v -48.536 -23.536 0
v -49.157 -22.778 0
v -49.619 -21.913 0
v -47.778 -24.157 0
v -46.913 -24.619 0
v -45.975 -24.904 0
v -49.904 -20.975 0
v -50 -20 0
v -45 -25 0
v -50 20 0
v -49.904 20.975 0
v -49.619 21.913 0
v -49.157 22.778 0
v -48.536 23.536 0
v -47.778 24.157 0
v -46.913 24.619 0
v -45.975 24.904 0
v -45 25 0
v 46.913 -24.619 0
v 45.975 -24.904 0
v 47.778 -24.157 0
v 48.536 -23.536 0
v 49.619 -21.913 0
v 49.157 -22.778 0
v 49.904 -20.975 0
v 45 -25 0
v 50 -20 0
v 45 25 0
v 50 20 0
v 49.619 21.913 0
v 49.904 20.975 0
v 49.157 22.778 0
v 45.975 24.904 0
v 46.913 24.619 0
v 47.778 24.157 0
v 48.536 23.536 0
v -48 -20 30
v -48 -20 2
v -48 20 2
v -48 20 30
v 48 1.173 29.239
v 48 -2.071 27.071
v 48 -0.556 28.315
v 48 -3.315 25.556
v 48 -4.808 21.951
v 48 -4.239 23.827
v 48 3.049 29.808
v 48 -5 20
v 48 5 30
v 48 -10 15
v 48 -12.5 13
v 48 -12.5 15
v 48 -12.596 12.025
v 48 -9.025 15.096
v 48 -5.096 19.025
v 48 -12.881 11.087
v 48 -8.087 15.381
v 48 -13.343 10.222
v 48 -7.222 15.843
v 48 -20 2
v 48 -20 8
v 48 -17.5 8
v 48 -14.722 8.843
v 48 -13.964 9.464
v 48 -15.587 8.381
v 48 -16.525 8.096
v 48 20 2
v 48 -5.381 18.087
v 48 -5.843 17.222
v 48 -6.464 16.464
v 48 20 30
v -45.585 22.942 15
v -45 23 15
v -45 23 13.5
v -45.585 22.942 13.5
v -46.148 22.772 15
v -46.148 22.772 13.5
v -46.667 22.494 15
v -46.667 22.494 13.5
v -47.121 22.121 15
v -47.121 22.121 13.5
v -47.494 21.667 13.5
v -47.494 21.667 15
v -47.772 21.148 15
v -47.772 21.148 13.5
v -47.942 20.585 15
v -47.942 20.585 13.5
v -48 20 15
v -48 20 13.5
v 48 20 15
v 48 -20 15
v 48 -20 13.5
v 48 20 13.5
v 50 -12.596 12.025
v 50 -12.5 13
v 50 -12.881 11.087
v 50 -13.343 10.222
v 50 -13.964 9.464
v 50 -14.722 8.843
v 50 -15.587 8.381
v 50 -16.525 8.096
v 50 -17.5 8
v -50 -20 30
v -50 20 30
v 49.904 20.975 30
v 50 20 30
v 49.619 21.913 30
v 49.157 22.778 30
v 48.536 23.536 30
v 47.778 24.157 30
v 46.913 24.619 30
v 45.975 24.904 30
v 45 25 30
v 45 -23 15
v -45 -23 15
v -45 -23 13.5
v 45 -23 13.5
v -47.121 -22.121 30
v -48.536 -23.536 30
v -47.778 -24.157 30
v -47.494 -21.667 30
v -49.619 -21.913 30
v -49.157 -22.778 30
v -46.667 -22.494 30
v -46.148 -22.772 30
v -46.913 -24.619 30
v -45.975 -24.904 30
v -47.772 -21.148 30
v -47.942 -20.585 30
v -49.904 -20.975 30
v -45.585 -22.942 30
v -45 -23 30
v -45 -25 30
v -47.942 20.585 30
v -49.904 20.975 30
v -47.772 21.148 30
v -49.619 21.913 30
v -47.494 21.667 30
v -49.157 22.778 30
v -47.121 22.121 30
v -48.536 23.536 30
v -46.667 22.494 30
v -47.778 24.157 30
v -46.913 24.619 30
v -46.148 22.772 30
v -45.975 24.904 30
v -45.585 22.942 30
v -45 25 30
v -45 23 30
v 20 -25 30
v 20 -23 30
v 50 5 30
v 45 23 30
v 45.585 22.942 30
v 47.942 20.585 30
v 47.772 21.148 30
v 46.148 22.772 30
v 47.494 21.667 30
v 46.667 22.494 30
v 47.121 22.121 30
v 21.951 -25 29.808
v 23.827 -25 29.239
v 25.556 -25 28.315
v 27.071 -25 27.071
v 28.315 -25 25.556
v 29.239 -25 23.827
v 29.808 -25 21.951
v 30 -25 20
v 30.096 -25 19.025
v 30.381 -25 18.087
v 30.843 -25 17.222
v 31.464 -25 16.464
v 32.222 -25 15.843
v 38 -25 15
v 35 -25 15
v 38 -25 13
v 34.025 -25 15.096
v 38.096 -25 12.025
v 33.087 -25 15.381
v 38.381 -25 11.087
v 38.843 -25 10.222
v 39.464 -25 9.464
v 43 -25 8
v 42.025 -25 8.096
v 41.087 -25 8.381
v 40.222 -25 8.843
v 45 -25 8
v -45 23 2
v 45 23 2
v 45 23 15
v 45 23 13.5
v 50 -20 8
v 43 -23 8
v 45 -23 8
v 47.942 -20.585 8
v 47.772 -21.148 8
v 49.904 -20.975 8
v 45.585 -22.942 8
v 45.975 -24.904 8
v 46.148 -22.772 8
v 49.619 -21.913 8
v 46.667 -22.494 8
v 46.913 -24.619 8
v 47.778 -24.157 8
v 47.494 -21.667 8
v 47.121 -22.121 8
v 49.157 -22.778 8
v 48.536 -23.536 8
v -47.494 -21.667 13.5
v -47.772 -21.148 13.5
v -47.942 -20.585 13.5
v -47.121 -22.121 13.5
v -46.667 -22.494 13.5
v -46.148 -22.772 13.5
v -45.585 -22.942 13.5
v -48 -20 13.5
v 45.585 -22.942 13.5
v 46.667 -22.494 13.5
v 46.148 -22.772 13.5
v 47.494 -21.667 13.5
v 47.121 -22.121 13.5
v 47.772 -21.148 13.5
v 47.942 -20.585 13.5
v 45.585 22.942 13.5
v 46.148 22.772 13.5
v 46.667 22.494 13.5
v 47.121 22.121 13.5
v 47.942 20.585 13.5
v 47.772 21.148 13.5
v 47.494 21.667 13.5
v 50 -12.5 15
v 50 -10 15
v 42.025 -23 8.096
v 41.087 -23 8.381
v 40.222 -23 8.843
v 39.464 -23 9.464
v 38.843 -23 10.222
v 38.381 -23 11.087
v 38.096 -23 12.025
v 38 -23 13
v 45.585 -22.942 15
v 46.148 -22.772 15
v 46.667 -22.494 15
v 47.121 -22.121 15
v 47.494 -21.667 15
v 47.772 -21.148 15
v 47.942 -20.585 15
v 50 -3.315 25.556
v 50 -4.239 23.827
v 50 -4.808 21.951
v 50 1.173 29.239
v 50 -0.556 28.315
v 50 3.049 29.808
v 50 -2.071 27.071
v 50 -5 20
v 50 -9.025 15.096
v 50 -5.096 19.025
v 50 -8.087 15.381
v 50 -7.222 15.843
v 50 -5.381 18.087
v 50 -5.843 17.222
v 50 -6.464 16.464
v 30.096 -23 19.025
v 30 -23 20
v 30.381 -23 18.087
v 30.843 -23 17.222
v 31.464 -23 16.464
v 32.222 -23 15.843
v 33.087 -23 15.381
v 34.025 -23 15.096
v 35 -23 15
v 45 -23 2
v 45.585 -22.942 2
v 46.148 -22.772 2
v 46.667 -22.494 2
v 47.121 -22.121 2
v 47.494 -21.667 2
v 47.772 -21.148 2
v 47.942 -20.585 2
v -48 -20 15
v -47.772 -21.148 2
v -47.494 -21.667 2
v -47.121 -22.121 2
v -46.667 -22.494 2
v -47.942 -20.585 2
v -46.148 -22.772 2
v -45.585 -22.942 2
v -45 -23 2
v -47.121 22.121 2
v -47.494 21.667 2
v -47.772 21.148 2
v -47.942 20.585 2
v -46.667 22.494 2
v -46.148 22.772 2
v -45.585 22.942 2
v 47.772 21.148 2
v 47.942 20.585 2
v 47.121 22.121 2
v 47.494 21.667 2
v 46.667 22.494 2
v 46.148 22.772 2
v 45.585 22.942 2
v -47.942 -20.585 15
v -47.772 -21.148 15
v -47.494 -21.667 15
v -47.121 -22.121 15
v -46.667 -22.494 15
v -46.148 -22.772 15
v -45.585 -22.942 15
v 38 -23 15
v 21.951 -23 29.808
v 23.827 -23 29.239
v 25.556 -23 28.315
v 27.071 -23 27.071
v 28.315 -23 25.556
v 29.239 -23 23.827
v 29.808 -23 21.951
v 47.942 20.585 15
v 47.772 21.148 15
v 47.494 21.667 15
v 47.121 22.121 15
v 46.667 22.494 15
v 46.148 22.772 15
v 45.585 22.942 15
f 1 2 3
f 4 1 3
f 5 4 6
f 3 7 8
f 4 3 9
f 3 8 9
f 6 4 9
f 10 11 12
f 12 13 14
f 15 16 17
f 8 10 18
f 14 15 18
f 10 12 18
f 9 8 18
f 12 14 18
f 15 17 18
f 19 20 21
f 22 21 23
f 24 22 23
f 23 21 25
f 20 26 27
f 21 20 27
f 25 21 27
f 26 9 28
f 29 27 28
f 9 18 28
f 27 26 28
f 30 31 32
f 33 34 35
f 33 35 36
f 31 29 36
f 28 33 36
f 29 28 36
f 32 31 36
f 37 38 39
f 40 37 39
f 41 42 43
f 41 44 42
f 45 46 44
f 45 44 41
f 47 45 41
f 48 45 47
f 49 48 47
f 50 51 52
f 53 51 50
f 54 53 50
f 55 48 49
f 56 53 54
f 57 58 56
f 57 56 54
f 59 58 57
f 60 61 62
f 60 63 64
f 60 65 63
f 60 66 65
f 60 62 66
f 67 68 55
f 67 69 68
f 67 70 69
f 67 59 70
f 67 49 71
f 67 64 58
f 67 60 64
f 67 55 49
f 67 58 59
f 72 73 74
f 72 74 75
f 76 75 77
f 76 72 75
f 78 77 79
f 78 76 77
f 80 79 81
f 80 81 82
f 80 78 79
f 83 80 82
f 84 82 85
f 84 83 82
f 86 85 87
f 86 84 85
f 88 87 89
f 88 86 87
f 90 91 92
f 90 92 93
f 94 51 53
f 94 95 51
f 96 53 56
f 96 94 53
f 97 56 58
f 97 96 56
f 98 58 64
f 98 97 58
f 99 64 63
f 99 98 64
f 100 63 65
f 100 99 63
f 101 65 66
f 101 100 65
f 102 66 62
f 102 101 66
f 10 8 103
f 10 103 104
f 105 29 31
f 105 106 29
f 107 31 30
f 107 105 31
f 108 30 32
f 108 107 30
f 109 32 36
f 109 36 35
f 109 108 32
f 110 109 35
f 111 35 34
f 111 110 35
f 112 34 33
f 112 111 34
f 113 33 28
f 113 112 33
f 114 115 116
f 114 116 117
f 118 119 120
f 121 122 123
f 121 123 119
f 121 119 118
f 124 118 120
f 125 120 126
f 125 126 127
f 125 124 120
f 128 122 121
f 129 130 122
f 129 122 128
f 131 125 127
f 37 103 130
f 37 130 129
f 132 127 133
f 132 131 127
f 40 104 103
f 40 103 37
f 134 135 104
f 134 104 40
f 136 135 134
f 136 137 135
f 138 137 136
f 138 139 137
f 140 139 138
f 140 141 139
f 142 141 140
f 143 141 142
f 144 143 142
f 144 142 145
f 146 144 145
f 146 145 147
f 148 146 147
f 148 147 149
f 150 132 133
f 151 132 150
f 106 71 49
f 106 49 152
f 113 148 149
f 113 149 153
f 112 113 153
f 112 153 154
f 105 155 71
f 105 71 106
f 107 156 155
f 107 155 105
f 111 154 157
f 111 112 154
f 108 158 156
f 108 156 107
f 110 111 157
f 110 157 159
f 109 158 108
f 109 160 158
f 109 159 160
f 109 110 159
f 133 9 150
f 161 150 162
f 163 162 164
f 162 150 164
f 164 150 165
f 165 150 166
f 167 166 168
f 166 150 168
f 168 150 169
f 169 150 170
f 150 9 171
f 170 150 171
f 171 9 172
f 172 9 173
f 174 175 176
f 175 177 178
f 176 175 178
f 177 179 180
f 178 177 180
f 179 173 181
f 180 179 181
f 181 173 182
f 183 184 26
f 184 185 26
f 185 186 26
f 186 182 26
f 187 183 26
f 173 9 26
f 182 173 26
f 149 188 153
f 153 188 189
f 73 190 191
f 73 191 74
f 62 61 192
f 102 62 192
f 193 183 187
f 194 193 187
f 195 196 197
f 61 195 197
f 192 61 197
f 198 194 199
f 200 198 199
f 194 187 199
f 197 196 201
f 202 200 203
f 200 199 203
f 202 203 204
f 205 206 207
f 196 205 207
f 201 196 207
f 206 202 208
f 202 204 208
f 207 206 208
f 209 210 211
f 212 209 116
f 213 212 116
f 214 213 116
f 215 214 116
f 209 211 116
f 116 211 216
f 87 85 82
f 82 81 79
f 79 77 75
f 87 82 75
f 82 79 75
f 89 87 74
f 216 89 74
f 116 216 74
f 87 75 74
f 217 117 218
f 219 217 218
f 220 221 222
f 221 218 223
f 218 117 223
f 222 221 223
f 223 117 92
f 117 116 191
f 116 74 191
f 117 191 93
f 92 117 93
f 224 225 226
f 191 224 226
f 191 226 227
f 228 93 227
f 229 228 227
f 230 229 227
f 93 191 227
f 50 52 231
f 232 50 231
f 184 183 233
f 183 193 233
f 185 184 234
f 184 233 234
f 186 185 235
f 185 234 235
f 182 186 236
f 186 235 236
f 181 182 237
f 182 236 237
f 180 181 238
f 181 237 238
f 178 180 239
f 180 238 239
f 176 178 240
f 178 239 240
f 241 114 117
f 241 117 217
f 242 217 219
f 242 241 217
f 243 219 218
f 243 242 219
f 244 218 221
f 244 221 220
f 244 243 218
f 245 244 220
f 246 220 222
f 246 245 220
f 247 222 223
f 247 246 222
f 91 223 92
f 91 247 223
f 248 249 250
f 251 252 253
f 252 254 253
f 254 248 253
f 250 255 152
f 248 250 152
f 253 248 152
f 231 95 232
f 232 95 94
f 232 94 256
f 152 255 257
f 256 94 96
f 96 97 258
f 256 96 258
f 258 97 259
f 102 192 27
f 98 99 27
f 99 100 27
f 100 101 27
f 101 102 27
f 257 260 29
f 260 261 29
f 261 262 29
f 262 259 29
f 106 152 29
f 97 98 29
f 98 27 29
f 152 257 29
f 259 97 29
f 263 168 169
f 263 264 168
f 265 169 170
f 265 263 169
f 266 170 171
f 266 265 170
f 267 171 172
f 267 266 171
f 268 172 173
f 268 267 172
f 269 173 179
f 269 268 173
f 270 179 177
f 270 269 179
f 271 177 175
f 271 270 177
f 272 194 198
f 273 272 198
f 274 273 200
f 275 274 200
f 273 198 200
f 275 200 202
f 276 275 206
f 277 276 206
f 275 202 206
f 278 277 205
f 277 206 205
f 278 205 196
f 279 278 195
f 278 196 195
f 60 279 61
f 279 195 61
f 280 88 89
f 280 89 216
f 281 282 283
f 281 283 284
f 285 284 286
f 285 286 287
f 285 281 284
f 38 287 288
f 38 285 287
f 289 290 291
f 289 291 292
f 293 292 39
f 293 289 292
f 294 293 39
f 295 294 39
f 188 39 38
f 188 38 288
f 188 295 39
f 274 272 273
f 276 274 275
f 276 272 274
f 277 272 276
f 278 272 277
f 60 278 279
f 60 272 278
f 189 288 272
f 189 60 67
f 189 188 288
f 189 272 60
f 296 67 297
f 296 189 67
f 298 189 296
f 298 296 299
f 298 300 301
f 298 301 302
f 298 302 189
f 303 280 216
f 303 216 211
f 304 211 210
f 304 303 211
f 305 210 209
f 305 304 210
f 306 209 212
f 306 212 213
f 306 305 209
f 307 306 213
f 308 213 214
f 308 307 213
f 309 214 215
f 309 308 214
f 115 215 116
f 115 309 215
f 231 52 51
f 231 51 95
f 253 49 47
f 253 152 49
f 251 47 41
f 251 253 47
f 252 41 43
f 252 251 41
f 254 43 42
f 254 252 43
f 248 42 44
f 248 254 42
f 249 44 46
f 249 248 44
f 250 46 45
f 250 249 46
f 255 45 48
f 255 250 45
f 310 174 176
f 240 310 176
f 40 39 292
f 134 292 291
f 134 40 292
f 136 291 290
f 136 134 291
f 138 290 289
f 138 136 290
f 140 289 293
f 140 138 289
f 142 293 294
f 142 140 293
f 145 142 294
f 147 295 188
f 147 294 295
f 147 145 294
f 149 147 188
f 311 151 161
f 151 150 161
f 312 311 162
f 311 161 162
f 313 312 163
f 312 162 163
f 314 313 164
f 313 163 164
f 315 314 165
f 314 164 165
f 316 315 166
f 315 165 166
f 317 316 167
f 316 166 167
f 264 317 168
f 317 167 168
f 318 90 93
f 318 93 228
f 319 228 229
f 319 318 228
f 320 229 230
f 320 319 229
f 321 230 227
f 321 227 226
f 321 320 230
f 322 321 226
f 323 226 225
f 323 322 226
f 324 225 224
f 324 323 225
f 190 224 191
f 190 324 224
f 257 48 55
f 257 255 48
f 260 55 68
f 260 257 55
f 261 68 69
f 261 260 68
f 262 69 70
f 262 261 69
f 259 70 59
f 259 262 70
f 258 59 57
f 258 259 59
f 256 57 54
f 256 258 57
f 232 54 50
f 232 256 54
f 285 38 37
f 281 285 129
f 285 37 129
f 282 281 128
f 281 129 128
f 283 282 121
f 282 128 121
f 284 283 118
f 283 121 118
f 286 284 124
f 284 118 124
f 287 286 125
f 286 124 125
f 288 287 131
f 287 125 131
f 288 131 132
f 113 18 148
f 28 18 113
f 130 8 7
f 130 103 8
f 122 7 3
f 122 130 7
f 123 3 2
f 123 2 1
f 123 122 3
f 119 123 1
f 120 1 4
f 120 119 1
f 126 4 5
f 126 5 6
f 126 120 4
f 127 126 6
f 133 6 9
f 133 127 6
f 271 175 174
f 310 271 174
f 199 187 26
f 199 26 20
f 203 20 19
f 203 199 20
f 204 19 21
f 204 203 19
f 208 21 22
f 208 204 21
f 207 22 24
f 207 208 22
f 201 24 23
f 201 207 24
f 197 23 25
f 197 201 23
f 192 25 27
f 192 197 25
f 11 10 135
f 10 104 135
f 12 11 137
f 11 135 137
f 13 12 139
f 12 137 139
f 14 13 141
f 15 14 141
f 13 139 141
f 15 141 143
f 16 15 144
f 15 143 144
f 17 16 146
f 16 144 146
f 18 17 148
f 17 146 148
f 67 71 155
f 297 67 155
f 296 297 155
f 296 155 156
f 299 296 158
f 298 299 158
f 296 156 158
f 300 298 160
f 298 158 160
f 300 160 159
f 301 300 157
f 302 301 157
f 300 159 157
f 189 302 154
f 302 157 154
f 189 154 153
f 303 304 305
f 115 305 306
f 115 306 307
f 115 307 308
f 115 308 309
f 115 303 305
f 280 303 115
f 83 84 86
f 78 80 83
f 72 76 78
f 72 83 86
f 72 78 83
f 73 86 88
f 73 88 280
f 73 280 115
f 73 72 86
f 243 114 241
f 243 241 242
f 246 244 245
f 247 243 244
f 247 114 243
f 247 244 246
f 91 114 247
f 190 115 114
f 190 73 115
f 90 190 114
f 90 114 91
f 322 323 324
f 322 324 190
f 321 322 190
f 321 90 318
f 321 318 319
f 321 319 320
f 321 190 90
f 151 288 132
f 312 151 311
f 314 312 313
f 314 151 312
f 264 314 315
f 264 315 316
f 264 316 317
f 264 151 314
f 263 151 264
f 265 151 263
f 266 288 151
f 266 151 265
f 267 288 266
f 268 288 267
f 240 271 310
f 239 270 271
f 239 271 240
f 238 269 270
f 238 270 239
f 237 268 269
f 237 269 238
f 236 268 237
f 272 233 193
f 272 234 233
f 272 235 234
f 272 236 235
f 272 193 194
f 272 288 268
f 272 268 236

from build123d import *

# Parameters (mm, degrees)
F0_W      = 100
F0_H      = 50
F1_DEPTH  = 30
F2_R      = 5
F3_T      = -2
F4_W      = 15
F4_H      = 15
F5_DEPTH  = 20
F6_W      = 7
F6_H      = 7
F7_DEPTH  = 12.5
F11_DEPTH = 1.5
F13_R     = 10
F14_R     = 4.99999
F15_R     = 5


# Not quite as in the source:
# - a fillet or chamfer is up to 0.001 mm smaller than in the source, because OpenCascade refuses the exact size
# - a feature of the source that left no trace in its solid (it failed there, or was rolled back) is left out


with BuildPart() as f1:
    # F0 (on Top) → F1 (new body)
    with BuildSketch(Plane.XY):
        Rectangle(F0_W, F0_H)
    extrude(amount=F1_DEPTH)

    # F2
    f2_edges = [f1.edges().sort_by_distance(p)[0] for p in [
        (50, -25, 15),
        (50, 25, 15),
        (-50, -25, 15),
        (-50, 25, 15),
    ]]
    fillet(f2_edges, radius=F2_R)

    # F3
    f3_openings = [f1.faces().sort_by_distance(p)[0] for p in [
        (0, 0, 30),
    ]]
    offset(amount=F3_T, openings=f3_openings)

    # F4 (on face) → F5 (cut)
    with BuildSketch(Plane.XZ.offset(25)):
        with Locations((37.5, 22.5)):
            Rectangle(F4_W, F4_H)
        Polygon((45, 30), (45, 15), (56.0200872774, 15), (56.0200872774, 39.6855616785), (30, 39.6855616785), (30, 30), align=None)
    extrude(amount=-F5_DEPTH, mode=Mode.SUBTRACT)

    # F6 (on face) → F7 (cut)
    with BuildSketch(Plane.XZ.offset(25)):
        with Locations((41.5, 11.5)):
            Rectangle(F6_W, F6_H)
        Polygon((56.9183766905, 18.8221567892), (38, 18.8221567892), (38, 15), (45, 15), (45, 8), (56.9183766905, 8), align=None)
    extrude(amount=-F7_DEPTH, mode=Mode.SUBTRACT)

    # F13
    f13_edges = [f1.edges().sort_by_distance(p)[0] for p in [
        (30, -24, 30),
        (49, -5, 30),
    ]]
    fillet(f13_edges, radius=F13_R)

    # F14 (radius 5 in the source; OpenCascade refuses exactly that, so slightly less here)
    f14_edges = [f1.edges().sort_by_distance(p)[0] for p in [
        (30, -24, 15),
        (49, -5, 15),
    ]]
    fillet(f14_edges, radius=F14_R)

    # F15
    f15_edges = [f1.edges().sort_by_distance(p)[0] for p in [
        (38, -24, 8),
        (49, -12.5, 8),
    ]]
    fillet(f15_edges, radius=F15_R)


with BuildPart() as f11:
    # F10 (on offset) → F11 (new body)
    with BuildSketch(Plane.XY.offset(15)):
        with BuildLine():
            ThreePointArc((-45, 23), (-47.1213203436, 22.1213203436), (-48, 20))
            Line((-48, 20), (-48, -20))
            ThreePointArc((-48, -20), (-47.1213203436, -22.1213203436), (-45, -23))
            Line((-45, -23), (45, -23))
            ThreePointArc((45, -23), (47.1213203436, -22.1213203436), (48, -20))
            Line((48, -20), (48, 20))
            ThreePointArc((48, 20), (47.1213203436, 22.1213203436), (45, 23))
            Line((45, 23), (-45, 23))
        make_face()
    extrude(amount=-F11_DEPTH)


solid = Compound([f1.part, f11.part])
